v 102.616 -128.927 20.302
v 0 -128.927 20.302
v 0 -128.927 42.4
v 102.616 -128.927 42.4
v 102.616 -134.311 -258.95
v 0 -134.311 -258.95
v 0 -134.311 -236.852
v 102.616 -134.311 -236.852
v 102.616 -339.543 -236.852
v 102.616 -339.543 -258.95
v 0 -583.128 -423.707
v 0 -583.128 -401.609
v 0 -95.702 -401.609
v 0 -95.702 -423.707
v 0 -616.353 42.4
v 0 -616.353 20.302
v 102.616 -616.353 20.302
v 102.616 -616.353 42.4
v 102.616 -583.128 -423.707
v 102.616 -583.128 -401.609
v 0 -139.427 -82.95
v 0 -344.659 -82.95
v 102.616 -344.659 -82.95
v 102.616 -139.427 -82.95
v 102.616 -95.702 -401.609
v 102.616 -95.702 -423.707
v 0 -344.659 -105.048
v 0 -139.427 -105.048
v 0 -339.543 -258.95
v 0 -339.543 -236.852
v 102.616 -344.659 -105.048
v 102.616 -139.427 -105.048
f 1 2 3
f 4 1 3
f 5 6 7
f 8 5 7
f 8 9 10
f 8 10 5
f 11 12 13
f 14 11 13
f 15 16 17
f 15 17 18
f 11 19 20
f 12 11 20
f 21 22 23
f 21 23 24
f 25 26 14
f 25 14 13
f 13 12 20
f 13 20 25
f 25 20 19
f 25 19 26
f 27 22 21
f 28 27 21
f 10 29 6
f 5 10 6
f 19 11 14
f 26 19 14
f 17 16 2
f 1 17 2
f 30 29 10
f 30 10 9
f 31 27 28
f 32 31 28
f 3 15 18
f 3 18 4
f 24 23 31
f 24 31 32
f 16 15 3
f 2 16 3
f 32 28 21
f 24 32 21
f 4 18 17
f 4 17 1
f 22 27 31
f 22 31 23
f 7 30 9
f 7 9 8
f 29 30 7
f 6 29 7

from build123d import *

# Parameters (mm, degrees)
F0_W     = 487.426
F0_H     = 22.098
F0_W_2   = 205.232
F1_DEPTH = 102.616


with BuildPart() as f1:
    # F0 (on Right) → F1 (new body)
    with BuildSketch(Plane.YZ):
        with Locations((-372.639737, 31.350956)):
            Rectangle(F0_W, F0_H)
        with Locations((-242.043304, -93.998613)):
            Rectangle(F0_W_2, F0_H)
        with Locations((-236.927241, -247.901017)):
            Rectangle(F0_W_2, F0_H)
        with Locations((-339.415094, -412.657811)):
            Rectangle(F0_W, F0_H)
    extrude(amount=F1_DEPTH)


solid = f1.part
